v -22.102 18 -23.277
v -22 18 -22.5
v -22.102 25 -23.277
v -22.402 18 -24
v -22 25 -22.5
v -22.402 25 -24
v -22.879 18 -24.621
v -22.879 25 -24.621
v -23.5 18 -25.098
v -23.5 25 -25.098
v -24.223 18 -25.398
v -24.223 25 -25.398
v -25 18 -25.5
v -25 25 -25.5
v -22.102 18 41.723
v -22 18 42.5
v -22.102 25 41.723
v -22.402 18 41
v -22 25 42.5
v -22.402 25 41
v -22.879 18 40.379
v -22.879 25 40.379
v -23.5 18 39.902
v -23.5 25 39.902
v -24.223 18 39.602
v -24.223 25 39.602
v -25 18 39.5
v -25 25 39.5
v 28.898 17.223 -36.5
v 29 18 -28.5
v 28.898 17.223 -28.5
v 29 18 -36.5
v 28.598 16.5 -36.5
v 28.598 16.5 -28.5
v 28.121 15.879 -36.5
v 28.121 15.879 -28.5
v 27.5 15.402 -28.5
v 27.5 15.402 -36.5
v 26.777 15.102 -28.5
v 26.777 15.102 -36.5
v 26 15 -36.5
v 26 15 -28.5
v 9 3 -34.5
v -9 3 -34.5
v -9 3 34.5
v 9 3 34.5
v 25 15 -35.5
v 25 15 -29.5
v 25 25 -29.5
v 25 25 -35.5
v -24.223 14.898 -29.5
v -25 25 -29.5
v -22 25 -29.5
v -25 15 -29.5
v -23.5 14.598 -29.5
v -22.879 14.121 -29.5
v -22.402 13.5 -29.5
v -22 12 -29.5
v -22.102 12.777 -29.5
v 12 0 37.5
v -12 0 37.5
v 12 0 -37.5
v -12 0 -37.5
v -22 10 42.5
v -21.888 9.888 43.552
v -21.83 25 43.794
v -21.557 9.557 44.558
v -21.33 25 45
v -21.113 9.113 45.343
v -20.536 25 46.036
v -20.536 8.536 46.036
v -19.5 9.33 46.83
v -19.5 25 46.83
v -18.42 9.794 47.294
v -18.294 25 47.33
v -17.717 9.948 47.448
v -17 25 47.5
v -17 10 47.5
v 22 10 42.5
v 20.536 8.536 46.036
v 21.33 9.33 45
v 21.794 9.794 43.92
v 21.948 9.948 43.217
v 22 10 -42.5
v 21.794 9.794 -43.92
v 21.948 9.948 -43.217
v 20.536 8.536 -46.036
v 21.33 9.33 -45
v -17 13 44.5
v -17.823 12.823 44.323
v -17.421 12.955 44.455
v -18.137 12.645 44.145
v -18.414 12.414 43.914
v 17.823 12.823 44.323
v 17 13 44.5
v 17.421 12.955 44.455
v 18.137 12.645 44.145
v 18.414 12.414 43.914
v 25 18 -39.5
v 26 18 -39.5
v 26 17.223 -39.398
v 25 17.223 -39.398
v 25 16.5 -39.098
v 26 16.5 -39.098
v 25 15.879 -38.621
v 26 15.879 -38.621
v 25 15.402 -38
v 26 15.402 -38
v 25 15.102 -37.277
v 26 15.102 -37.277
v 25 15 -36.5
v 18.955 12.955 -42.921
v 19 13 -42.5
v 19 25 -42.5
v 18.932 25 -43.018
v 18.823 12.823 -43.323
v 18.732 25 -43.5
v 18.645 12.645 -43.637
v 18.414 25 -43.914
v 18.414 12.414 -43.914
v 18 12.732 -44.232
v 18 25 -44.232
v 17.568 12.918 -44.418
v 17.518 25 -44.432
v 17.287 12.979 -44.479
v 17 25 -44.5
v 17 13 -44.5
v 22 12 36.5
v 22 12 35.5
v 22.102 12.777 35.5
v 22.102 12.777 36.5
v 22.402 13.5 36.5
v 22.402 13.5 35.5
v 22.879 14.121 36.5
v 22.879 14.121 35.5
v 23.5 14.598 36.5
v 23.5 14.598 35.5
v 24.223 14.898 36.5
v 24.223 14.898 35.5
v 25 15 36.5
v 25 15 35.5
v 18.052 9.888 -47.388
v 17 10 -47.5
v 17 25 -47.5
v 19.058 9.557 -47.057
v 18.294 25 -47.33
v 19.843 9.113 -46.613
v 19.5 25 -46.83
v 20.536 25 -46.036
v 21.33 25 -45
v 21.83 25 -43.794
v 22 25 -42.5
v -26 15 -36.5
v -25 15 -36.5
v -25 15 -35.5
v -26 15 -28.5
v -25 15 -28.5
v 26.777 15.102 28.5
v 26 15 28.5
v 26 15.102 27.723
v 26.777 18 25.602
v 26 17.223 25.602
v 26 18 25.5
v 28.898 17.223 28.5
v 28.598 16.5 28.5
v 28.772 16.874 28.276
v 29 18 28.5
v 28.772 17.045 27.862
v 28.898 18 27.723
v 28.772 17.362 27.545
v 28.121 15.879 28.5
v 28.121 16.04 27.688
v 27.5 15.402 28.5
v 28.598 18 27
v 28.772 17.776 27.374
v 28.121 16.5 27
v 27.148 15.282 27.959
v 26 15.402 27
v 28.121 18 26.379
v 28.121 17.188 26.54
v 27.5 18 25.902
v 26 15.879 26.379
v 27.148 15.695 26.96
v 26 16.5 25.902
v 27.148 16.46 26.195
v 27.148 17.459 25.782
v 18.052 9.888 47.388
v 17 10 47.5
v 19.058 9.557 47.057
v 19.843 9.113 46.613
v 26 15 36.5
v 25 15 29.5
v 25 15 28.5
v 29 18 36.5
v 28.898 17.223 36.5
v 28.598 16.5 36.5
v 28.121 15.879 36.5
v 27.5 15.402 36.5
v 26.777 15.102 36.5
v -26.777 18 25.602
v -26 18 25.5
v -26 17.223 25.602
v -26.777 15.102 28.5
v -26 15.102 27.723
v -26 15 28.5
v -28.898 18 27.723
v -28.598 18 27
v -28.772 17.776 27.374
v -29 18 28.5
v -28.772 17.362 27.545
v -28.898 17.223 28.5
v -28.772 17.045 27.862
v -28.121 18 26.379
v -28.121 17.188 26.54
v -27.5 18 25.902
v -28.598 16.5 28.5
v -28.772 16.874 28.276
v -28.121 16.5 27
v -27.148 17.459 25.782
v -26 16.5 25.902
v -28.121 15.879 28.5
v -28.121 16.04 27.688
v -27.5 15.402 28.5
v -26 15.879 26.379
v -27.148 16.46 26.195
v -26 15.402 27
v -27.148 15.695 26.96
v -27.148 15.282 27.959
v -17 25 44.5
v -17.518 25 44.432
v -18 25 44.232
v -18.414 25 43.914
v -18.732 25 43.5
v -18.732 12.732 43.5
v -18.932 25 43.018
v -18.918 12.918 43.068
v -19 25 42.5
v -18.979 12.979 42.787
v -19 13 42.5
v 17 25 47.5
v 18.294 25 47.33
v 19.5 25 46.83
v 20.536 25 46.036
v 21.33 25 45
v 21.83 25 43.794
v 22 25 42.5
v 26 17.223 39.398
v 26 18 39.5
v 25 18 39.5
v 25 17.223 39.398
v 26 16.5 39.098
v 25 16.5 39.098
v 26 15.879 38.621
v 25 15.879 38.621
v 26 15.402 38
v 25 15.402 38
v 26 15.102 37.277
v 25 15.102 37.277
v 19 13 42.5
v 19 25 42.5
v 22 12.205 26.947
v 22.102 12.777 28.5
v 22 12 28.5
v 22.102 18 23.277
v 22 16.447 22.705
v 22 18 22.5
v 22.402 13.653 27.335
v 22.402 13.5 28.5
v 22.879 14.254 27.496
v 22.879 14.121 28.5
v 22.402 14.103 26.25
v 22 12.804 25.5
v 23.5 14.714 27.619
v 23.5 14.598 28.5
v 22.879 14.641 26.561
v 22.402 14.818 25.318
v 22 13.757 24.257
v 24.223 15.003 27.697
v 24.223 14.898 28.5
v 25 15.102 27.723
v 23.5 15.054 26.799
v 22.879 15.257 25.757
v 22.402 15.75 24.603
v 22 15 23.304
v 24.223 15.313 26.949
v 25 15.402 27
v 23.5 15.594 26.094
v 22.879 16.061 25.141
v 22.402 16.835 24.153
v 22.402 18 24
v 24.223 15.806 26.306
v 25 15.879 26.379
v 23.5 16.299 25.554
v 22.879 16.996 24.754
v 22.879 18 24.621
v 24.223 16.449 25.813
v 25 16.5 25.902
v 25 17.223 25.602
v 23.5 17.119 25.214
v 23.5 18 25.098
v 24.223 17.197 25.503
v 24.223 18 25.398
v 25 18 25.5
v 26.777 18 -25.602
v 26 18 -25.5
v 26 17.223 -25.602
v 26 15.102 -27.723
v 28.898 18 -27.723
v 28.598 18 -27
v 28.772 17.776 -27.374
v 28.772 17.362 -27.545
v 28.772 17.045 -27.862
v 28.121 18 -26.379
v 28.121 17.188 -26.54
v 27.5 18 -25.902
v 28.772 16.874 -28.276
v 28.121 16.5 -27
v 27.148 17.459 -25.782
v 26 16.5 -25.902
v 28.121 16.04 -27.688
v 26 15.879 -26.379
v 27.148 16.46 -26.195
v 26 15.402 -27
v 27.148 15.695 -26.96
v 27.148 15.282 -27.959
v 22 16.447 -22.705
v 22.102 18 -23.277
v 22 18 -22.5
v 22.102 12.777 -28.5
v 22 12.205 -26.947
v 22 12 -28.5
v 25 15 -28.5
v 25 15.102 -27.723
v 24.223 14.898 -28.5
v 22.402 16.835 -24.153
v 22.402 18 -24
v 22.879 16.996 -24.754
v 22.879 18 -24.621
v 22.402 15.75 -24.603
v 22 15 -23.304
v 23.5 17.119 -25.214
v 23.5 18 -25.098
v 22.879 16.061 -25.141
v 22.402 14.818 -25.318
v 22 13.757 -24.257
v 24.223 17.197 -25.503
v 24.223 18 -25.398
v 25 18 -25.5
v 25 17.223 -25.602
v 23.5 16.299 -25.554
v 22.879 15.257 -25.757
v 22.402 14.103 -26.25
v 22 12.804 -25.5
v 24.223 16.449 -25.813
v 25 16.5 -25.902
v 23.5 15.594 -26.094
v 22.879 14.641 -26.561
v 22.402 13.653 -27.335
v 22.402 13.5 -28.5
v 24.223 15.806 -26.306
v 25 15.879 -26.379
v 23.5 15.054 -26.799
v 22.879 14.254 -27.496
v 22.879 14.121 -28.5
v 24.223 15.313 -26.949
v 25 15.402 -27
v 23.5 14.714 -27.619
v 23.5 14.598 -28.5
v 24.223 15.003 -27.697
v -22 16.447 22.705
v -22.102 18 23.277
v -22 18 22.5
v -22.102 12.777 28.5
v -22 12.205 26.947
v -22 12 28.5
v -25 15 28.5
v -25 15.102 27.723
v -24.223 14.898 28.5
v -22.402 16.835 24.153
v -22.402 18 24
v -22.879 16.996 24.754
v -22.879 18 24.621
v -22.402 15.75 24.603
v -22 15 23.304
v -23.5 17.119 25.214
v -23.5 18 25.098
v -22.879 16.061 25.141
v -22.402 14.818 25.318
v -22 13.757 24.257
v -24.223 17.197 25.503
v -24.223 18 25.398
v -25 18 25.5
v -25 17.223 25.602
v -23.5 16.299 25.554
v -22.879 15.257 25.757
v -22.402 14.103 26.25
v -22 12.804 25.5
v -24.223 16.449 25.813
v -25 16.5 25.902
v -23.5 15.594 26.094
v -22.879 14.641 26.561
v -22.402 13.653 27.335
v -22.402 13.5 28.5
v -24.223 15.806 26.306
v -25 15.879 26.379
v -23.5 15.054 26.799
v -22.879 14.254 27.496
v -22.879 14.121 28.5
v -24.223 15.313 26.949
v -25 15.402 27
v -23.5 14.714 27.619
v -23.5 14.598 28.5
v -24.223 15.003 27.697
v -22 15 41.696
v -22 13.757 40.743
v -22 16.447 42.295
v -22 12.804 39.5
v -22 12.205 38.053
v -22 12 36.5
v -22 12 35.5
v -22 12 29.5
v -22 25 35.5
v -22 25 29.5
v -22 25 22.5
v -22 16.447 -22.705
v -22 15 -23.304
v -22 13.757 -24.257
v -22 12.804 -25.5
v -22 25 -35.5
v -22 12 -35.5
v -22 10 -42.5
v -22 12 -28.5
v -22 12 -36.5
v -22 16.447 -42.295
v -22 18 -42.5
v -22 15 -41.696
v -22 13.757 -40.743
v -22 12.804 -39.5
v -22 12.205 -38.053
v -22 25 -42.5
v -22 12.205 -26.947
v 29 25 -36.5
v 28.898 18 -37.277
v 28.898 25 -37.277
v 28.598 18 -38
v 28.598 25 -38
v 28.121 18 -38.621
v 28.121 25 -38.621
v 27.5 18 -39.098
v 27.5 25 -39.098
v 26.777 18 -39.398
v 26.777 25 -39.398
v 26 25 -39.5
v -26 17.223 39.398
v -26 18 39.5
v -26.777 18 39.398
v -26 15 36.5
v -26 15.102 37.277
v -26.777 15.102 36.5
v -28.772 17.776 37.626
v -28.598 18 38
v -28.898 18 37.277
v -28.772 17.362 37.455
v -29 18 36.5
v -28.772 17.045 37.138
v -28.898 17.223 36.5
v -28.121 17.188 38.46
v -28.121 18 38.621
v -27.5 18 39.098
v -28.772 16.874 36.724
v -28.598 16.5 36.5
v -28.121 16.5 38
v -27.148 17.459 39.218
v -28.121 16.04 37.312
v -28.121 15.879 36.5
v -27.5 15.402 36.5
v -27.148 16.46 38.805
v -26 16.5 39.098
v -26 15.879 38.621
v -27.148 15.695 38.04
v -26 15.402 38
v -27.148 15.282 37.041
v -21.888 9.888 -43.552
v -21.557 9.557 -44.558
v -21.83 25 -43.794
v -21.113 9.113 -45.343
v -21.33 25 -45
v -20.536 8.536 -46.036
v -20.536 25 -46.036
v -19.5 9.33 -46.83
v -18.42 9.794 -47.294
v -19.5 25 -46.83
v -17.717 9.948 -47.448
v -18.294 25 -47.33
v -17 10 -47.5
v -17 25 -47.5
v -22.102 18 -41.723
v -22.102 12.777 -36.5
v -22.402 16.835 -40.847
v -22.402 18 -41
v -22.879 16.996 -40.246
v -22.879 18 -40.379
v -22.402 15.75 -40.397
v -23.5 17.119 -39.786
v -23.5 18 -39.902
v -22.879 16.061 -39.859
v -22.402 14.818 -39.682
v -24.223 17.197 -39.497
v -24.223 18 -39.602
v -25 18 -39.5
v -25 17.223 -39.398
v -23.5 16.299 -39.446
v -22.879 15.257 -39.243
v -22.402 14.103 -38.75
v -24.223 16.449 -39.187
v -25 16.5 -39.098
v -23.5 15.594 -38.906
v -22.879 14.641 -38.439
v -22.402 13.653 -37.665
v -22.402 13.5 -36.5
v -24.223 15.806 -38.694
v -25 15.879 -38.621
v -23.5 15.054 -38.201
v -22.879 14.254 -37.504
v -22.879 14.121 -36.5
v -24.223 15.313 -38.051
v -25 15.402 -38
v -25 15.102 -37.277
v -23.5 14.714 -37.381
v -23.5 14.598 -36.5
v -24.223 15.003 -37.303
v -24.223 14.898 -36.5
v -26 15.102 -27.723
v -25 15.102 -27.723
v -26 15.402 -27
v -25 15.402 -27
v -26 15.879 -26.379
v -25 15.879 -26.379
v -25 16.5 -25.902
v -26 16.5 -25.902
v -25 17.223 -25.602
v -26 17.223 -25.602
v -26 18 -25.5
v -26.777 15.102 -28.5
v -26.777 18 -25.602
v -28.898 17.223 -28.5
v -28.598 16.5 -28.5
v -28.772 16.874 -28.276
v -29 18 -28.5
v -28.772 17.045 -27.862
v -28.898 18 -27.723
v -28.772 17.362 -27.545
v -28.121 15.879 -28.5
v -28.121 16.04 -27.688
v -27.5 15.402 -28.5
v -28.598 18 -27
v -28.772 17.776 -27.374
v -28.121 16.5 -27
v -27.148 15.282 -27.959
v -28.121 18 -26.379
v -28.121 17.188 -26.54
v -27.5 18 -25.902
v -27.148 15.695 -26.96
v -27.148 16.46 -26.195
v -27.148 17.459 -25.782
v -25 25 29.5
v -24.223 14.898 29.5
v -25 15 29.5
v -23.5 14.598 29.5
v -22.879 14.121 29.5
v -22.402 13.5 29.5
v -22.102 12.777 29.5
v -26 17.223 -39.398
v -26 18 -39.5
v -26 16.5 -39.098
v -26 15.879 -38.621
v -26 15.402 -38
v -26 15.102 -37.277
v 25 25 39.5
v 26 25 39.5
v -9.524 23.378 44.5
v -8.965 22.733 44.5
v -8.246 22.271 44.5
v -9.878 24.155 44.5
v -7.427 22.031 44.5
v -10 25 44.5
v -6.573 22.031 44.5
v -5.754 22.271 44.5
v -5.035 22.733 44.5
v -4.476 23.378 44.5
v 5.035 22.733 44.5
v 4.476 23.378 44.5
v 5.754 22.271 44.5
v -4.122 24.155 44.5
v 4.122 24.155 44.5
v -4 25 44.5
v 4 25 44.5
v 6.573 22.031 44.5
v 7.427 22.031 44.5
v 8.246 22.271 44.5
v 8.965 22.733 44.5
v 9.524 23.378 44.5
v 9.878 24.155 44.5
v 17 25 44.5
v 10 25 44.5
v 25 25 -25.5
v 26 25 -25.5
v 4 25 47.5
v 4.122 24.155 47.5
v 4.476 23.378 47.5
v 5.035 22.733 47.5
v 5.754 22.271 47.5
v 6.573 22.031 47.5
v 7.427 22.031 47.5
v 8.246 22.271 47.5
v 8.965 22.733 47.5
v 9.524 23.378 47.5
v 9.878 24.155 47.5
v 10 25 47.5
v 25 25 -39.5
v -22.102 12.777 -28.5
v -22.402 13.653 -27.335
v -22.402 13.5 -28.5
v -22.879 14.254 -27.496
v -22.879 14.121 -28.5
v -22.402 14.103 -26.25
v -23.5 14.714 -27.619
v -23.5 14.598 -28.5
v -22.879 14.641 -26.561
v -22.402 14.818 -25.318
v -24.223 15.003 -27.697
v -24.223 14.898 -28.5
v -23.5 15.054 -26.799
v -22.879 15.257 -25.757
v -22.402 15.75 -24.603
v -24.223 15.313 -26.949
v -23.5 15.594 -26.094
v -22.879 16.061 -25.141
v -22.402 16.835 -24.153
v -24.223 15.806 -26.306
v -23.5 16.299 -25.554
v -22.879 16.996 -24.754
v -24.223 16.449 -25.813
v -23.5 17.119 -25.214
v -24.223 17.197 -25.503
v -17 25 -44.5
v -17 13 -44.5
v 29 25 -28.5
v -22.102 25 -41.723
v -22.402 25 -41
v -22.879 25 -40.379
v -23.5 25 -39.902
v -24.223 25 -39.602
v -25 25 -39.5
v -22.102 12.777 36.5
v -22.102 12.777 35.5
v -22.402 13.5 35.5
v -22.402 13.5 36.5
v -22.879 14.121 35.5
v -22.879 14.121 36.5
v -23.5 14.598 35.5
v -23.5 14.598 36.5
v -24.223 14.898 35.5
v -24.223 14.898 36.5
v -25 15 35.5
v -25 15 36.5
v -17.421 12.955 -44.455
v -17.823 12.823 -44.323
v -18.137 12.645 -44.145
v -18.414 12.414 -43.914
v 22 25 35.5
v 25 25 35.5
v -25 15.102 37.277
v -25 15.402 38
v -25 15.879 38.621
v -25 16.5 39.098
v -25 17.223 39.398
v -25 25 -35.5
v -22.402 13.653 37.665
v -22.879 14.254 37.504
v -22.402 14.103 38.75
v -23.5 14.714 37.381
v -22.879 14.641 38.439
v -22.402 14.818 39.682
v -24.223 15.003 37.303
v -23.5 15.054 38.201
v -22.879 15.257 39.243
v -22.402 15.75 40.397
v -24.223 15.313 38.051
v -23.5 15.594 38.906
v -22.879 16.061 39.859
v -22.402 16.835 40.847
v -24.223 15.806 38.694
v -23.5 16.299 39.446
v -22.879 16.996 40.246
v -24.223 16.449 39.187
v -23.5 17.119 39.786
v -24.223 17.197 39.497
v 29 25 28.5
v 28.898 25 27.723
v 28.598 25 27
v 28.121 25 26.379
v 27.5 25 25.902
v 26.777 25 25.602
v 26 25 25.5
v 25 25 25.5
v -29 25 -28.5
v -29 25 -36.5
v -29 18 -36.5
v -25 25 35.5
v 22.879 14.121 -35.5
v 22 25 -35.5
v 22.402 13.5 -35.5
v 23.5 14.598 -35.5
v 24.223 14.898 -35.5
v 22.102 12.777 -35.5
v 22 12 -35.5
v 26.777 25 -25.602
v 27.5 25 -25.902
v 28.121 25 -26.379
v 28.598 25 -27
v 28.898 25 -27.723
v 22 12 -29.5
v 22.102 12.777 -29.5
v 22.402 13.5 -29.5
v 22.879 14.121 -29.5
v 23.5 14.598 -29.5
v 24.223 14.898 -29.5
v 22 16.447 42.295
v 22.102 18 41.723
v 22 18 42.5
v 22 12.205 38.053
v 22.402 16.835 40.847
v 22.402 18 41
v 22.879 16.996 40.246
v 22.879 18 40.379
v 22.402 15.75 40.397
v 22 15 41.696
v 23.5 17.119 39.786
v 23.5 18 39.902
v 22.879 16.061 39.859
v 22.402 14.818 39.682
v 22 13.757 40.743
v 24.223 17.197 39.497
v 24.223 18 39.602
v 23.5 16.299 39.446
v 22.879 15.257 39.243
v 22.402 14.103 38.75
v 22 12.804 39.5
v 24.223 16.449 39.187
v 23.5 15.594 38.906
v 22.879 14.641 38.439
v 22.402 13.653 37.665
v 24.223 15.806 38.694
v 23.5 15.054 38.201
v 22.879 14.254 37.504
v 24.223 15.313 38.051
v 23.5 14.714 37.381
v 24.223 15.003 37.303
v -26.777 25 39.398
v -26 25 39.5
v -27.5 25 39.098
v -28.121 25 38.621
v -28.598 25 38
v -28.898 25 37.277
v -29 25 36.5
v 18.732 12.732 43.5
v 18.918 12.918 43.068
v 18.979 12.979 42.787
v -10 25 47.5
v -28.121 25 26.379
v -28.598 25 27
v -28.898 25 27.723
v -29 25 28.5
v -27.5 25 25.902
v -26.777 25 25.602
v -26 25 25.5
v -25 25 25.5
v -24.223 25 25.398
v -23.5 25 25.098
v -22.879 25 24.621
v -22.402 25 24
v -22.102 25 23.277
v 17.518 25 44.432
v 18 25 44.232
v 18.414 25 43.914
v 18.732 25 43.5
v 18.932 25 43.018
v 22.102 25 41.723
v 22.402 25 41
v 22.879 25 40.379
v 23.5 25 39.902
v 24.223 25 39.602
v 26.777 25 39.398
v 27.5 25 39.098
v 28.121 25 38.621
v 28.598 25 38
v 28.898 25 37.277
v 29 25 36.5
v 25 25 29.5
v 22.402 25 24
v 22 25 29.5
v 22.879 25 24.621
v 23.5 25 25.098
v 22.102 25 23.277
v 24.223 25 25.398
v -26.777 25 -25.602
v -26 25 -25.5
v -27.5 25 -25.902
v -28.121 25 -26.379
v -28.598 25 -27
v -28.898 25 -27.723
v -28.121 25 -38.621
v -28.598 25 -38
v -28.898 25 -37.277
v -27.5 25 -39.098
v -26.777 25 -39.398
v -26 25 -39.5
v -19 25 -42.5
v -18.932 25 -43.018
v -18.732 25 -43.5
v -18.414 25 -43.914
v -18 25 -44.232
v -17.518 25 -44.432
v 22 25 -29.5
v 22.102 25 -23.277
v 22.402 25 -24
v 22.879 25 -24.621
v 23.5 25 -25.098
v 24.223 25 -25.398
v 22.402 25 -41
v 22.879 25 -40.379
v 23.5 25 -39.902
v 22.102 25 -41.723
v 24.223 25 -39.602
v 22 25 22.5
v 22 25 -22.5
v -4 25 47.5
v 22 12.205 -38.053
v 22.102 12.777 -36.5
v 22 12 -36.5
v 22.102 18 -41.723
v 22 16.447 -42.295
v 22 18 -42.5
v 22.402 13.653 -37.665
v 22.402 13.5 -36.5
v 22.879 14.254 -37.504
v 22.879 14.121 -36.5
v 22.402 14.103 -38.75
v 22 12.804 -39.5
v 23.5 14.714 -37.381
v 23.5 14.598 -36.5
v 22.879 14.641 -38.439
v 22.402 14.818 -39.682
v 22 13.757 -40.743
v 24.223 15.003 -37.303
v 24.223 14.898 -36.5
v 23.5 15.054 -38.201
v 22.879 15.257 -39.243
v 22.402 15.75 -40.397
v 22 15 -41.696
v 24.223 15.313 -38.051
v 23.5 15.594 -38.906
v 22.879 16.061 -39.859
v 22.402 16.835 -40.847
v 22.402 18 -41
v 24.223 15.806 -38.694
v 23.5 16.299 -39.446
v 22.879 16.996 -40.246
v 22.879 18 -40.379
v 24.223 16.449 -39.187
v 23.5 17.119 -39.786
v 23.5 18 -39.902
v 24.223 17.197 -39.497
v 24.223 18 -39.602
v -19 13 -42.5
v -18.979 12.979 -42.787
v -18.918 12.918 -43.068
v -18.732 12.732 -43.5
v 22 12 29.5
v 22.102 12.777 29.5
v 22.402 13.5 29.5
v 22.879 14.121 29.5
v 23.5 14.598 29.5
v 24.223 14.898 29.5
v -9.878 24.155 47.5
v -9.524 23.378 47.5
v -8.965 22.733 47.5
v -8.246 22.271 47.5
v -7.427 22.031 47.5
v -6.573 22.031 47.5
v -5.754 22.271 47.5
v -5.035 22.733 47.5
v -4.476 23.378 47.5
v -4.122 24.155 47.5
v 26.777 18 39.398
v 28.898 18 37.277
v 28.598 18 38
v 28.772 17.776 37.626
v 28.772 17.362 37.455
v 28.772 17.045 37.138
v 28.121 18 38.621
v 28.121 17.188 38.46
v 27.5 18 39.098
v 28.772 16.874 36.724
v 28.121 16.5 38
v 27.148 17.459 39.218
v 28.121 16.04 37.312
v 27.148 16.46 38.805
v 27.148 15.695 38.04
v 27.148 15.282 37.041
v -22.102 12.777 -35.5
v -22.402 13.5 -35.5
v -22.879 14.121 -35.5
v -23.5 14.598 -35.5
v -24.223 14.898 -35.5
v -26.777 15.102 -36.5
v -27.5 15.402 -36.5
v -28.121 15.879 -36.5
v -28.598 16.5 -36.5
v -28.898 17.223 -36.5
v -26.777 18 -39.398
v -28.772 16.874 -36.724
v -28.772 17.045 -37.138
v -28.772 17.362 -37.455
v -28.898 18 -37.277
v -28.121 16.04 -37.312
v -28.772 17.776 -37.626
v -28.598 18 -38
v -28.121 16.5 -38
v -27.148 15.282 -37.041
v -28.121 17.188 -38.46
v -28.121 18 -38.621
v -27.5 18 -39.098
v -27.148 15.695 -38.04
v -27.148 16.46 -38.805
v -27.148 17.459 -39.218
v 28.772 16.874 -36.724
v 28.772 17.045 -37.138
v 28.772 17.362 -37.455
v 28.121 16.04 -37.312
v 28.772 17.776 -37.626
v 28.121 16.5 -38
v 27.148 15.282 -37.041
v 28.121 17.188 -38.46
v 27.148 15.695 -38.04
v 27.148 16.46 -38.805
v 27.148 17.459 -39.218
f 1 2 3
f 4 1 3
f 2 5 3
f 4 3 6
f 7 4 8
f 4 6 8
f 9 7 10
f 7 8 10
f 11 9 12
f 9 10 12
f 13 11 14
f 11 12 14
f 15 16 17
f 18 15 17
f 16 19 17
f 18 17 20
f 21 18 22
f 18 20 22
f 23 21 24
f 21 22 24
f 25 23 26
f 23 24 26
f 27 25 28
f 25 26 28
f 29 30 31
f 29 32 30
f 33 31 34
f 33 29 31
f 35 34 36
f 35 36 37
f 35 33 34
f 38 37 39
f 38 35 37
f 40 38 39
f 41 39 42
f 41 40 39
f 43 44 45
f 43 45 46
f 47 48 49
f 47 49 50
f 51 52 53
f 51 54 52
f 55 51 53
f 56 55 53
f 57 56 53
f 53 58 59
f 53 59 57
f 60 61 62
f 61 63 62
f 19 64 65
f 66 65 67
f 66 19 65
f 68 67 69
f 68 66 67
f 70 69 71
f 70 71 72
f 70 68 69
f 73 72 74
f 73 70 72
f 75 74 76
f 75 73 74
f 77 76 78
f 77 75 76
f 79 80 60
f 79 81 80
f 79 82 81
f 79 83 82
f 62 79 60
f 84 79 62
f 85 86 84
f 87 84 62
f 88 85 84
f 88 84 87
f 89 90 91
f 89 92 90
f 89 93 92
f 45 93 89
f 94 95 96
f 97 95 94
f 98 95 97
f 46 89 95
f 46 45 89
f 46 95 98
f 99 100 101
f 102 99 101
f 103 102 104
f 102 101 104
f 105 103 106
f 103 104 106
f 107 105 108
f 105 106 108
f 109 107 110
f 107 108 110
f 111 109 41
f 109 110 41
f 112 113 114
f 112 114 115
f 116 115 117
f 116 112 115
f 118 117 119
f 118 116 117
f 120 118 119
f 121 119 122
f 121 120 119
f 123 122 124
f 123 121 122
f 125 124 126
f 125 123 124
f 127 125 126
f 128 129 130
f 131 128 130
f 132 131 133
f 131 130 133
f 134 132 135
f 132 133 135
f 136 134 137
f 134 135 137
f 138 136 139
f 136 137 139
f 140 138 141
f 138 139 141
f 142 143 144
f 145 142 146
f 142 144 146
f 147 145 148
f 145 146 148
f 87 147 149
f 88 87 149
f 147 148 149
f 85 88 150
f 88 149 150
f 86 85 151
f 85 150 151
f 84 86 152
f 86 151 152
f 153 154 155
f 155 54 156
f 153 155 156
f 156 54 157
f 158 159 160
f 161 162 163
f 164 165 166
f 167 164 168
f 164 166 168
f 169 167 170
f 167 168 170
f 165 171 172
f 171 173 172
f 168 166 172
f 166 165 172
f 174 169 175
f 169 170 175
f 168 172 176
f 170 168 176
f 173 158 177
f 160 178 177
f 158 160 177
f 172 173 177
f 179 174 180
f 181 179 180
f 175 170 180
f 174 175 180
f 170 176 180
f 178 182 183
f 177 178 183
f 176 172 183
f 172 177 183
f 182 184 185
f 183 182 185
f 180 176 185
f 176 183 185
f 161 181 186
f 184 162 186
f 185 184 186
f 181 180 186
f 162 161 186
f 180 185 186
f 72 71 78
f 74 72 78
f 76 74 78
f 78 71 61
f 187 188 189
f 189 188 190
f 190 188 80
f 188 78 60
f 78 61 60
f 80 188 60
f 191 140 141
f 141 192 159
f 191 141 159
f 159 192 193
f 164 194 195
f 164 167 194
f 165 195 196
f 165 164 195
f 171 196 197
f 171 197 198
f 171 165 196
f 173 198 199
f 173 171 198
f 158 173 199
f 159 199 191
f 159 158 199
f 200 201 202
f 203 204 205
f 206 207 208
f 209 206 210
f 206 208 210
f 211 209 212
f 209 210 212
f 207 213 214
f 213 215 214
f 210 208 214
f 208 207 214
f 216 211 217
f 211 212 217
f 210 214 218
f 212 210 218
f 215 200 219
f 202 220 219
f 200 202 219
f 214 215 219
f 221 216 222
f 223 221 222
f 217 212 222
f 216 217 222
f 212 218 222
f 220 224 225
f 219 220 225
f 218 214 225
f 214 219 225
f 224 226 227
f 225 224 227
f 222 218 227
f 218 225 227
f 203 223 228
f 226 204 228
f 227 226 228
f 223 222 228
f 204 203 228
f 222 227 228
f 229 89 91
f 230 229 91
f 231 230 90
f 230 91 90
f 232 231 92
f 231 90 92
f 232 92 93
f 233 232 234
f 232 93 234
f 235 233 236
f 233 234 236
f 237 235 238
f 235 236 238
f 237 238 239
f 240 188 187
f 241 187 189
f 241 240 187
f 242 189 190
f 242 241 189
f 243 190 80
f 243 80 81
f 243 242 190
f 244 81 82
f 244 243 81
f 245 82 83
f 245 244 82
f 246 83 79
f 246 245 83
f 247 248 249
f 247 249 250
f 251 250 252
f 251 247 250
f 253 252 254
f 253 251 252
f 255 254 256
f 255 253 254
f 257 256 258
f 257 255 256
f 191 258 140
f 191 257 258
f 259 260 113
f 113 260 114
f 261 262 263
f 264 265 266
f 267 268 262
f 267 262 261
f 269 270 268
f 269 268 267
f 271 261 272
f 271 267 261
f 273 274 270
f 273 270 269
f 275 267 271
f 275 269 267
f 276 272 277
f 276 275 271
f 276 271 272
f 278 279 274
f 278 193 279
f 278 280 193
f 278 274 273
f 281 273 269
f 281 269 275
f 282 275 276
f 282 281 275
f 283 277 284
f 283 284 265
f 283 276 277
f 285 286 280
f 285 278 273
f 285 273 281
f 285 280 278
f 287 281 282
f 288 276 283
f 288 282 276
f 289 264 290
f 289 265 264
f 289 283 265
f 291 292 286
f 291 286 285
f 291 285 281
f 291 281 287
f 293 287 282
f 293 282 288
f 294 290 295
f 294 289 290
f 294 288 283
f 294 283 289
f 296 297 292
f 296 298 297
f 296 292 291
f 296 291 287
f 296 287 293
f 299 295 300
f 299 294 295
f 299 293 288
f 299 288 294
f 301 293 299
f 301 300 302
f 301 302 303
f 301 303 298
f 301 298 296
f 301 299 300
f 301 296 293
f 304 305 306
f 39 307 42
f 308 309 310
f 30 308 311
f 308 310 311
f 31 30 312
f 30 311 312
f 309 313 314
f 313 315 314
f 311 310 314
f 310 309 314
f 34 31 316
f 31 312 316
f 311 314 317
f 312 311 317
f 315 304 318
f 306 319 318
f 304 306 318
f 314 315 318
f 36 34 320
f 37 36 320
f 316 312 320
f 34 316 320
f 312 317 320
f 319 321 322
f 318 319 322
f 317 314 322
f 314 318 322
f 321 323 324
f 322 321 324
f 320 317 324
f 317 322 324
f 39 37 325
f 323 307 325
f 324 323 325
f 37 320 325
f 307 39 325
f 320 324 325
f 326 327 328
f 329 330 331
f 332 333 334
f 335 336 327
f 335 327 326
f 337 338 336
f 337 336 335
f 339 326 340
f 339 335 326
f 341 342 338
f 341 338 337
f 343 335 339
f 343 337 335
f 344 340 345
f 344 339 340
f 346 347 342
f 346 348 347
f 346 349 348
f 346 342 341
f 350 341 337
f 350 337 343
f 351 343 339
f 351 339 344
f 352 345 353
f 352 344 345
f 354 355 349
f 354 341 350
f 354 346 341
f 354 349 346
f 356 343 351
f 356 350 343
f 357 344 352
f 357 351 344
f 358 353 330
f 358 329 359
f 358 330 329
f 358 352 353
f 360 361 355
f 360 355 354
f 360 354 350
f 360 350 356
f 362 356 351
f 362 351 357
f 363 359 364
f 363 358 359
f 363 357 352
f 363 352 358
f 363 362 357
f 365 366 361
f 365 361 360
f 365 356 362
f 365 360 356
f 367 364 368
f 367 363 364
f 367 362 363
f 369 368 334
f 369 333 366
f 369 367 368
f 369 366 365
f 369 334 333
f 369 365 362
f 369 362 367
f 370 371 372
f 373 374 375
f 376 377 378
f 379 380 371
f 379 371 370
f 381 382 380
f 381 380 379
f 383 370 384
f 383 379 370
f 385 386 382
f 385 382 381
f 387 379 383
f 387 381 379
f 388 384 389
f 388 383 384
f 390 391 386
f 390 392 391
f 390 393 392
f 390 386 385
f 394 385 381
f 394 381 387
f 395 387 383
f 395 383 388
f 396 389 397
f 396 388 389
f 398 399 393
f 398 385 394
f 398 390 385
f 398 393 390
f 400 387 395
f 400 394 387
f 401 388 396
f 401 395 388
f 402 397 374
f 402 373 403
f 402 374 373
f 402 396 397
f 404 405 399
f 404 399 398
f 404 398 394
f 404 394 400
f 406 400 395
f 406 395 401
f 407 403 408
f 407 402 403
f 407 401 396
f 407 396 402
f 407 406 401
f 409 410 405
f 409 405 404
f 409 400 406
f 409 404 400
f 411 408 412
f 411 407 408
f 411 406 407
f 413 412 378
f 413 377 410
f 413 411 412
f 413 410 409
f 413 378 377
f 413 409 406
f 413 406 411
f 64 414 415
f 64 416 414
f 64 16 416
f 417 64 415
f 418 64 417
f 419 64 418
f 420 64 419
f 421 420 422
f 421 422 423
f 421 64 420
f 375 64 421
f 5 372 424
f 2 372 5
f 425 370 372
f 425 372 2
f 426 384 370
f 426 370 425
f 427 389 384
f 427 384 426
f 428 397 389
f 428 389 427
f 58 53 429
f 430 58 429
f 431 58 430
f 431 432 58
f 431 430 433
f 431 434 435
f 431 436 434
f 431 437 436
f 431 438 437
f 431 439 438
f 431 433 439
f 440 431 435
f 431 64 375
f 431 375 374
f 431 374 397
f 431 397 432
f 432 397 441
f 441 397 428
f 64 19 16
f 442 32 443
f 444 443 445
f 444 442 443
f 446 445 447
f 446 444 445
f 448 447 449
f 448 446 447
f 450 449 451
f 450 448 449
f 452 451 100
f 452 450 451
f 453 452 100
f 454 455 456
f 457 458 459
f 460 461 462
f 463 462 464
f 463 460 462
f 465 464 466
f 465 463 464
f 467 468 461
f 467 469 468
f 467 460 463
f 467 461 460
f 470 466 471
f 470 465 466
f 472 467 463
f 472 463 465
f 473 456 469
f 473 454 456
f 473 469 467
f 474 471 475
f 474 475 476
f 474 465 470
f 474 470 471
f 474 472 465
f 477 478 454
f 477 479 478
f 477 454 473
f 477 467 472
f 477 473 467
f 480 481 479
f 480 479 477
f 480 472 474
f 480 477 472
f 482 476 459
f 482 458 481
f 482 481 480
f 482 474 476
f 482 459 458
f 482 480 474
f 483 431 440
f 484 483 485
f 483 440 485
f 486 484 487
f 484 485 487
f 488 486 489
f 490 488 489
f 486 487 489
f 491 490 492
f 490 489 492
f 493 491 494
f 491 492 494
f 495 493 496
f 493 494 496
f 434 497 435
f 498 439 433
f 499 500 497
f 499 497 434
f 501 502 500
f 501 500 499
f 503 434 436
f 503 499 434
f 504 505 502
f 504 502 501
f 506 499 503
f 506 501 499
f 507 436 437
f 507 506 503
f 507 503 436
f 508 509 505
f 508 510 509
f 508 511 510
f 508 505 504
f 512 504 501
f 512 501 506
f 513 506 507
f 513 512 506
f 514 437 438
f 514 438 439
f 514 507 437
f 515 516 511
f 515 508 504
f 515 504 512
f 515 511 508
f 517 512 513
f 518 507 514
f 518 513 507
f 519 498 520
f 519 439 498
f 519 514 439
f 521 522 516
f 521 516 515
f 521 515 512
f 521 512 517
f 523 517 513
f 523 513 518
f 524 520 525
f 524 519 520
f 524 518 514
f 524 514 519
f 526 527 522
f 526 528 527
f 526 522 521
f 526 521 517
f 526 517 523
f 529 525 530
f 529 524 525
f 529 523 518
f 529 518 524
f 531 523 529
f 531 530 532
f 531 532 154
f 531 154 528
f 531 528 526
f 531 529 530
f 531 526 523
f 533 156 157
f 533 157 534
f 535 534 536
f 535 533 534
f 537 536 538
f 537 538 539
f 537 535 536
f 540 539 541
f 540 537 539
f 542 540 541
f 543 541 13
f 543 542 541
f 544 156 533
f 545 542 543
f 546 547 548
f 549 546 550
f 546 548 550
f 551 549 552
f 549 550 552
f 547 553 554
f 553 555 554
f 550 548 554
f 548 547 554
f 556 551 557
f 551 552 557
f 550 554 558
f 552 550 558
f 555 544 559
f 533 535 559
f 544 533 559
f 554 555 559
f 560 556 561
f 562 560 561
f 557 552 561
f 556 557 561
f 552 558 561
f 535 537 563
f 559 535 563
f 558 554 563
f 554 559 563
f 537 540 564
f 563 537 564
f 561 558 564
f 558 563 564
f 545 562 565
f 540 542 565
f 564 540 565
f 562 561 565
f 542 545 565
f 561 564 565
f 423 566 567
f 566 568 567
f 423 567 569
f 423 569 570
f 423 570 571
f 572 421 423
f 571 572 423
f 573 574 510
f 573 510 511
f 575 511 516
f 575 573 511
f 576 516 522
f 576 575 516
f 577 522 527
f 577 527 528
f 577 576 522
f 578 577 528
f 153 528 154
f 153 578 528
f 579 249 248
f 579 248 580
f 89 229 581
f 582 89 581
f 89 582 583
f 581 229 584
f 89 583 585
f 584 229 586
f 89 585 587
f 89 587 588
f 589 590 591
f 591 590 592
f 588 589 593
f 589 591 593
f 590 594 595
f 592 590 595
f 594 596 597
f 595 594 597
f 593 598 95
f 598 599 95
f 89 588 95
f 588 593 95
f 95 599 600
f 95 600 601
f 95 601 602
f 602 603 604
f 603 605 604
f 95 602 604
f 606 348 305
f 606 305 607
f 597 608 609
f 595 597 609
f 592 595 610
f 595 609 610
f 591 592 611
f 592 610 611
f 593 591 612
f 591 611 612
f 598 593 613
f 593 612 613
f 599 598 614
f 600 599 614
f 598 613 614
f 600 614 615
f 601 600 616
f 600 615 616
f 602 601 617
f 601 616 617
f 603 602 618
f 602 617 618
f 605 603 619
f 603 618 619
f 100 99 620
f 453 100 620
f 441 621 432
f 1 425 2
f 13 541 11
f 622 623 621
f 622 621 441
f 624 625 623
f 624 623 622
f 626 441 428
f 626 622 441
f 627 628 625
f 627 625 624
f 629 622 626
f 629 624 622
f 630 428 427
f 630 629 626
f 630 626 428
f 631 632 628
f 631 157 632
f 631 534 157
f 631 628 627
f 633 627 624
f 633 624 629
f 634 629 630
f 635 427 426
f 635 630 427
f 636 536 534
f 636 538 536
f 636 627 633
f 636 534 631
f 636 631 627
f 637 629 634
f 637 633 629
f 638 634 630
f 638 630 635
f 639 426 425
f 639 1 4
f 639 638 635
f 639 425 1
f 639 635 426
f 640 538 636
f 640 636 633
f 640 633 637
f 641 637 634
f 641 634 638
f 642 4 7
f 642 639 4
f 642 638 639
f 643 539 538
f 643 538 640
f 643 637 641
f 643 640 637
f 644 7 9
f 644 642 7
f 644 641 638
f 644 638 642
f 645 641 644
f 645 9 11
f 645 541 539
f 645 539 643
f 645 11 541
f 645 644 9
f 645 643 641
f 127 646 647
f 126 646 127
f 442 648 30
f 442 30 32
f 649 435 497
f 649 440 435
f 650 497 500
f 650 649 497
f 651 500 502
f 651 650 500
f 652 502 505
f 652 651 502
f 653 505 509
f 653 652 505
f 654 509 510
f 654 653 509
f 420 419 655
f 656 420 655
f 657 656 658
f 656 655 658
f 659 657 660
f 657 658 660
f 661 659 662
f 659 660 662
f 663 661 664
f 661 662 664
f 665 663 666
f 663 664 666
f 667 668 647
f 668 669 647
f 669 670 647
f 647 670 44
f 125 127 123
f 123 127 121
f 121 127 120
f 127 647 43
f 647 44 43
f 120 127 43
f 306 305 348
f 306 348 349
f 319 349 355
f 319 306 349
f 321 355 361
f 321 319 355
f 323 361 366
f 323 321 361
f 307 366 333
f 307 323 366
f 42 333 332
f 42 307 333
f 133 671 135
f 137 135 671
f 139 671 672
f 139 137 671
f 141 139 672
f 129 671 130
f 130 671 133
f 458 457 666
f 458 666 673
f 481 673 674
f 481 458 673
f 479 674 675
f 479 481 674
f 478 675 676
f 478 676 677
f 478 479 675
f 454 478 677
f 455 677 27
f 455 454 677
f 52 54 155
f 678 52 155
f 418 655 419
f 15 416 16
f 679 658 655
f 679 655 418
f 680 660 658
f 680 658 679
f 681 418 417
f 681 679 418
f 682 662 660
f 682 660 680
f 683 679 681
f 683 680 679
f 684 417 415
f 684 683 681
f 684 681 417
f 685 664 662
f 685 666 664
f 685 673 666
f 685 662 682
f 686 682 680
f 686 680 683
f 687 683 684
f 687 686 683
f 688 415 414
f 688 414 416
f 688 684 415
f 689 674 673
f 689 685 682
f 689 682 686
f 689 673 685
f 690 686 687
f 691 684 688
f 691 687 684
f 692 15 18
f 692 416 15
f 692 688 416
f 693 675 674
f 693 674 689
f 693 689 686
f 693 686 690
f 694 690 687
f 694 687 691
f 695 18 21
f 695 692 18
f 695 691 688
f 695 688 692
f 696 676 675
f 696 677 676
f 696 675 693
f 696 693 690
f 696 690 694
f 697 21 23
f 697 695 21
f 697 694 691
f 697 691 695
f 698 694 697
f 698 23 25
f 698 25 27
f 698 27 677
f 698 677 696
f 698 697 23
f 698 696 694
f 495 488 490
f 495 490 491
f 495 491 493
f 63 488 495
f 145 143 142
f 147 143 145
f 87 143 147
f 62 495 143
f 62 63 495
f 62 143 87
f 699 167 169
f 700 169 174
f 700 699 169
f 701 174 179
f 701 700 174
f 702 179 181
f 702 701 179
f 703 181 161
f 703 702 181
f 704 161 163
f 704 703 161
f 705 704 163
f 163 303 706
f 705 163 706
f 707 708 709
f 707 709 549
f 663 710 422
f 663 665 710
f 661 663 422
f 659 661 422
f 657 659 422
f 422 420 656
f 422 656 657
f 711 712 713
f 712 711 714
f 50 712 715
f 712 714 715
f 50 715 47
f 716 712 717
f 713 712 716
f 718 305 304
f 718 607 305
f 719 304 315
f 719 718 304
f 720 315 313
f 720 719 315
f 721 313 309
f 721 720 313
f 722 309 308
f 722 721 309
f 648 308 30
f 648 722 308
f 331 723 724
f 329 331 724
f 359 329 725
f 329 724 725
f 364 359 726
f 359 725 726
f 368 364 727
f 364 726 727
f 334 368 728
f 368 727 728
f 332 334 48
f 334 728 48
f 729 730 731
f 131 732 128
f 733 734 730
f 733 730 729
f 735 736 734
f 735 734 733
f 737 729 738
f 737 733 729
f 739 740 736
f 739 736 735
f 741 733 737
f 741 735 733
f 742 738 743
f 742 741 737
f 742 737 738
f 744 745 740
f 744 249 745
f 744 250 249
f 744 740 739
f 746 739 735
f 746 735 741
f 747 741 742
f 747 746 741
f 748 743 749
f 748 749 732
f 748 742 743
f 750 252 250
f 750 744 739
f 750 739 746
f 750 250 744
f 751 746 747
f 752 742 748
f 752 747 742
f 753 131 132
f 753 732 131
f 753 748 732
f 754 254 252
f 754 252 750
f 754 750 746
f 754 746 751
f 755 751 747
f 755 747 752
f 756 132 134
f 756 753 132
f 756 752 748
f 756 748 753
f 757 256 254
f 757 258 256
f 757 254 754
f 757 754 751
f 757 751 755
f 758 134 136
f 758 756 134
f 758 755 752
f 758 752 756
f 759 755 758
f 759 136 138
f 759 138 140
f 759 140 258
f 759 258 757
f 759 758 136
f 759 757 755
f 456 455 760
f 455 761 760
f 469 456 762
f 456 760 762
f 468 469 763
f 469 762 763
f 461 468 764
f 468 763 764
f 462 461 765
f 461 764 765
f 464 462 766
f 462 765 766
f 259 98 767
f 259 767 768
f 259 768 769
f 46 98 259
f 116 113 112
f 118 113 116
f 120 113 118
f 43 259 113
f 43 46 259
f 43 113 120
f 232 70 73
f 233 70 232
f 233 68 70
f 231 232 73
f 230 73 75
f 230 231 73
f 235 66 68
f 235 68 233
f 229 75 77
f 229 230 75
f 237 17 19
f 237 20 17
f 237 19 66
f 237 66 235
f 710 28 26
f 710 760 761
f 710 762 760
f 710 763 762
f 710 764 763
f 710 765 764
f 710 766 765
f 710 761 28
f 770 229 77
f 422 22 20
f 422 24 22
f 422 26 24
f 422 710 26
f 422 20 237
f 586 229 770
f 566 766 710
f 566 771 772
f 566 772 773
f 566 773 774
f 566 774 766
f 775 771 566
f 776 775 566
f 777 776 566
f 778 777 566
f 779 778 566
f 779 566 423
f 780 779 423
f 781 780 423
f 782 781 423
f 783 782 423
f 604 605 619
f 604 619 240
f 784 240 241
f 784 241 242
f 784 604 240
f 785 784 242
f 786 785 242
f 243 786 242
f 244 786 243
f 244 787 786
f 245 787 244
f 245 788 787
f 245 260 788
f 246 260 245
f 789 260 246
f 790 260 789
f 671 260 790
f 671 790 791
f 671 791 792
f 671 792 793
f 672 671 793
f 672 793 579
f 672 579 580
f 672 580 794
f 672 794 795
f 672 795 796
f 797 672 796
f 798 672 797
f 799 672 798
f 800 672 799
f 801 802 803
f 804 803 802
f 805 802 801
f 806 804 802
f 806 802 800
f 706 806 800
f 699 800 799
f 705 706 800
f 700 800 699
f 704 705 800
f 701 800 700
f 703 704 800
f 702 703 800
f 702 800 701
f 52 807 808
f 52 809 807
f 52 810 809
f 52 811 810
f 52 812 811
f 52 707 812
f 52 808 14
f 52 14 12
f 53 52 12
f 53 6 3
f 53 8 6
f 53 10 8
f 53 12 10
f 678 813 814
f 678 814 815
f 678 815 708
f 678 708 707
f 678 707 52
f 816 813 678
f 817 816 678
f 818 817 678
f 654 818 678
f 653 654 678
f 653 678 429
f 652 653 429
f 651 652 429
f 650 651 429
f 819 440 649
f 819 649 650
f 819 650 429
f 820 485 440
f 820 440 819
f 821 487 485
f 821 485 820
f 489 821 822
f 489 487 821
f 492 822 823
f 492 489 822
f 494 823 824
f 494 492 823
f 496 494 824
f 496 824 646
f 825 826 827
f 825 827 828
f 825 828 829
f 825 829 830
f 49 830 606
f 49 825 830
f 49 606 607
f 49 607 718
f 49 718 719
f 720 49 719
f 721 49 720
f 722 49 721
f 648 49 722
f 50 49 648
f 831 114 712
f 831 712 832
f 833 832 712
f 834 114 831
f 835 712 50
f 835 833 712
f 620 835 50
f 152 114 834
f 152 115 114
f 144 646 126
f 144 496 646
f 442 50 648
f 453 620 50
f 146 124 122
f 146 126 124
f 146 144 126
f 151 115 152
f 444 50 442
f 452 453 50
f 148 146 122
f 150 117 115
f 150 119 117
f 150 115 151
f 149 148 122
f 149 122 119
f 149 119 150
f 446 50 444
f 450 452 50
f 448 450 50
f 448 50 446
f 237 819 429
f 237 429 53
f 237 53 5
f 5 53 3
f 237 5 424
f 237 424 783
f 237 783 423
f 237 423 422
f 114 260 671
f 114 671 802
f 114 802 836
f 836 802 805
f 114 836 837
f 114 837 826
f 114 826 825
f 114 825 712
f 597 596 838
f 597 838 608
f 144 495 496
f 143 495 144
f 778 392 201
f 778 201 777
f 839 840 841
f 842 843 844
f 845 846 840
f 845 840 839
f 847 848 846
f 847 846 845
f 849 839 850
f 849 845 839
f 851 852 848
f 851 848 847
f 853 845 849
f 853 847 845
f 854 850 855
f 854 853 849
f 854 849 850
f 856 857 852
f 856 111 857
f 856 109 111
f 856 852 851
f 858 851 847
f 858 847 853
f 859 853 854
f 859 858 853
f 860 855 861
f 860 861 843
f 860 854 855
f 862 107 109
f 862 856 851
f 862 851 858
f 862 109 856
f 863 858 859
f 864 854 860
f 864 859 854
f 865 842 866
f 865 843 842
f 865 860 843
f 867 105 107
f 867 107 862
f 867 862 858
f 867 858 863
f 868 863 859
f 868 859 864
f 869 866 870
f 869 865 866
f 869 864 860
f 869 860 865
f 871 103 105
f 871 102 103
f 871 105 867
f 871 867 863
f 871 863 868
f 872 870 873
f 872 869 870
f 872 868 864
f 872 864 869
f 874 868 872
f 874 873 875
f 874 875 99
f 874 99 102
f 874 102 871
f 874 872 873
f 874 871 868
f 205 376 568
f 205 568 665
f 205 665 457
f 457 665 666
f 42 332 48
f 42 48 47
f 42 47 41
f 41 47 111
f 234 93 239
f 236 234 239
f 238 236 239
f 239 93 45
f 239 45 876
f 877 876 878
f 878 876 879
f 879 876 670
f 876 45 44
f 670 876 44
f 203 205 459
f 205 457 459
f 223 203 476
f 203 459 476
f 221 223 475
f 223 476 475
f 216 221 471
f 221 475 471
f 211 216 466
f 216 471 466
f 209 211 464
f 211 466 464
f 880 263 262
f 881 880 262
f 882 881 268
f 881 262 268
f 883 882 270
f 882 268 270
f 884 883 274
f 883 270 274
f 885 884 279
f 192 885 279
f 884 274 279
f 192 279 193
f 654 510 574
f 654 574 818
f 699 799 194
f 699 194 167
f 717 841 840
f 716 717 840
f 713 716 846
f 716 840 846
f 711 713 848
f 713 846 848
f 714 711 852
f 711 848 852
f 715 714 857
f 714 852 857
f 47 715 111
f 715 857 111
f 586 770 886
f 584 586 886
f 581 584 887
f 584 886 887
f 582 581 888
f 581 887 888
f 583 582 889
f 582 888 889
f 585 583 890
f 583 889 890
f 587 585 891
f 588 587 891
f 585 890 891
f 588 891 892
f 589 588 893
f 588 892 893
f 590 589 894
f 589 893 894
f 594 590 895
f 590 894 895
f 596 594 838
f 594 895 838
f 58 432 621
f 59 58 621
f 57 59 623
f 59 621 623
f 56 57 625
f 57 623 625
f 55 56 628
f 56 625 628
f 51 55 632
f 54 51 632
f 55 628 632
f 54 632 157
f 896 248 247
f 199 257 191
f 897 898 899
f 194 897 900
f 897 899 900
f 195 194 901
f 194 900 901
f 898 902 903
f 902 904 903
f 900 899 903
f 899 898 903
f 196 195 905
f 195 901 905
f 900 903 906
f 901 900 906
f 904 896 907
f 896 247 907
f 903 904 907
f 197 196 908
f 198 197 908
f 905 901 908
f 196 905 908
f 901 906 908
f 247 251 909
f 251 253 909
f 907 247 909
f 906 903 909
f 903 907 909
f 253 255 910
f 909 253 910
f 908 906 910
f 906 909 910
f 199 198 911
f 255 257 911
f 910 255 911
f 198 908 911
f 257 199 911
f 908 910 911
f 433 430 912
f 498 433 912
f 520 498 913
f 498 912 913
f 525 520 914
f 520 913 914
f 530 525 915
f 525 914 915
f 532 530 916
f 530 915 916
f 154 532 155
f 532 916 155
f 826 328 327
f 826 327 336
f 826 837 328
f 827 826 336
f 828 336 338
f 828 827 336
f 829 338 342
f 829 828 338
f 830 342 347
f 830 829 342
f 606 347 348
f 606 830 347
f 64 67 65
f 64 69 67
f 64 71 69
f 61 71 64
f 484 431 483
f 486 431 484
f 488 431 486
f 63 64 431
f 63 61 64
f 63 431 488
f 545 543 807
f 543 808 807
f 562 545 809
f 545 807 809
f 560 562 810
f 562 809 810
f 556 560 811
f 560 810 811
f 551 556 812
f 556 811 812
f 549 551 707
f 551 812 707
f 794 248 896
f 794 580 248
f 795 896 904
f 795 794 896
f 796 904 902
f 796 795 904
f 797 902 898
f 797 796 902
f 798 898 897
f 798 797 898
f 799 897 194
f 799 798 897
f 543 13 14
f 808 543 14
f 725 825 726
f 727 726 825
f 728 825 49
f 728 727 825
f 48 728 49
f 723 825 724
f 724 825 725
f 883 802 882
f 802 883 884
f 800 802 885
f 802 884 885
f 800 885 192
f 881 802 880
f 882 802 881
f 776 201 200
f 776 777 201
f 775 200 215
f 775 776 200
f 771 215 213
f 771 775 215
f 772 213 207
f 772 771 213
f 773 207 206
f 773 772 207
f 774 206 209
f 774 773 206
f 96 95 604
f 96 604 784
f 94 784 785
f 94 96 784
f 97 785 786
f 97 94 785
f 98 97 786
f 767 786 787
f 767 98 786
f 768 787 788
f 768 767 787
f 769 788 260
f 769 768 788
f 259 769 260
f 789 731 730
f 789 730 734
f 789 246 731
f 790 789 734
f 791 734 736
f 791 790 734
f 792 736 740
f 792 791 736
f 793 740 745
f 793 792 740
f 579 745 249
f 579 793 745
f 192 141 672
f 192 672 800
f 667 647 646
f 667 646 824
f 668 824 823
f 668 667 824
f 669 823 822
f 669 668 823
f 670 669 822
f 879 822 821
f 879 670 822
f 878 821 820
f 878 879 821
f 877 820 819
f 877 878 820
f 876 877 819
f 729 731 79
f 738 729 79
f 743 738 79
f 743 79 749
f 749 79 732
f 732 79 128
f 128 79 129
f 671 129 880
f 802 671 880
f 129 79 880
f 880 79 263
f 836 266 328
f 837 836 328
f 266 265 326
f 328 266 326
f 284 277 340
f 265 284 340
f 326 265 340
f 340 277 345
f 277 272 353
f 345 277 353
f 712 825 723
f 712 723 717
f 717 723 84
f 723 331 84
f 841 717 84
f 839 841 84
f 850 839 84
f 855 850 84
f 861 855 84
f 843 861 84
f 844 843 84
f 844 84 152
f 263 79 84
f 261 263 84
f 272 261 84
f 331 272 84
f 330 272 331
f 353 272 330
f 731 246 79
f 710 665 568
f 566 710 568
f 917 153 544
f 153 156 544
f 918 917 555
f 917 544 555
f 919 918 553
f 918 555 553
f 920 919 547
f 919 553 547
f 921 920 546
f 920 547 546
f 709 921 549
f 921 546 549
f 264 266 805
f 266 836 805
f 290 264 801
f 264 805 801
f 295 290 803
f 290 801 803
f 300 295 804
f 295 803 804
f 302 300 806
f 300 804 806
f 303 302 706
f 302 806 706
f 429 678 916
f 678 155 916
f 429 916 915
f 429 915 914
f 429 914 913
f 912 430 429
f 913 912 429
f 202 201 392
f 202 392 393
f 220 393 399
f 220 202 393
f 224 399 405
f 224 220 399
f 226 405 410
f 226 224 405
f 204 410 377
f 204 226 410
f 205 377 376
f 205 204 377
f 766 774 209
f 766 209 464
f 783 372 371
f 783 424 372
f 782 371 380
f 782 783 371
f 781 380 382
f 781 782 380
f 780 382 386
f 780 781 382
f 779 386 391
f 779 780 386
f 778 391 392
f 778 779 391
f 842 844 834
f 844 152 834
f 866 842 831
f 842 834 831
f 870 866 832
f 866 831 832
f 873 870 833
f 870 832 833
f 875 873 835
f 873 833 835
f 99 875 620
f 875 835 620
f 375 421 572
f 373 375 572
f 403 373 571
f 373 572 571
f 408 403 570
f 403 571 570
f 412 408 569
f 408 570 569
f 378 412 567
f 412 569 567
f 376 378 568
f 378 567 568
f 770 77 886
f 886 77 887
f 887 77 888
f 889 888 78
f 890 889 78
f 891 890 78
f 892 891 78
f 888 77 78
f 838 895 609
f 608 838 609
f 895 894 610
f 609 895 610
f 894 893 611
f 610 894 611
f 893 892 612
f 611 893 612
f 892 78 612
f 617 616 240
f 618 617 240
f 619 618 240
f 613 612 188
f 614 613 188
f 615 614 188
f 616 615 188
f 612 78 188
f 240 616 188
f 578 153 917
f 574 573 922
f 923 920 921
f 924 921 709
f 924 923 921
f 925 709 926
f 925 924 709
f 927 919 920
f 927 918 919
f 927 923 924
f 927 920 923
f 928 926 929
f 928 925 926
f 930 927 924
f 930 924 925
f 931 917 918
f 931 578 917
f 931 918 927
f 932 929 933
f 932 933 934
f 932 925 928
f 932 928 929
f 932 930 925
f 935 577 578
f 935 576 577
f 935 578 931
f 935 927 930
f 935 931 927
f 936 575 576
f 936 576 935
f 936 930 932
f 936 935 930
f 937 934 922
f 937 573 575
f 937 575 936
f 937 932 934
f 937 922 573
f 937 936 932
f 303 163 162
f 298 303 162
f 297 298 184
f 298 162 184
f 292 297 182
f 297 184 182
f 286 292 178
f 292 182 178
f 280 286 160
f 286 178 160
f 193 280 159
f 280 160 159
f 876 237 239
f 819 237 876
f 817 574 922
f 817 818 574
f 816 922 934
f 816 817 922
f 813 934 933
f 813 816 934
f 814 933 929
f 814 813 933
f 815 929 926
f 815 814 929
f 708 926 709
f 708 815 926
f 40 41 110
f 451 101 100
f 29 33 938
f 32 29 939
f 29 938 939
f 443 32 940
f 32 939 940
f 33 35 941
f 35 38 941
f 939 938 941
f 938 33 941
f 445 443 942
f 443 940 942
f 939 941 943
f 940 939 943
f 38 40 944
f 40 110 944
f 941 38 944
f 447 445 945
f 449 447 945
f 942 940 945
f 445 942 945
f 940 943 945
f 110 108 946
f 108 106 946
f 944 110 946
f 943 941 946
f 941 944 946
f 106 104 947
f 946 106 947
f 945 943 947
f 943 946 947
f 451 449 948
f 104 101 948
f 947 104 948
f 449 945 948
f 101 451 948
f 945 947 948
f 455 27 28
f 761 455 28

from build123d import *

# Parameters (mm, degrees)
SKETCH1_W               = 44
SKETCH1_H               = 95
BOSS_EXTRUDE1_DEPTH     = 25
SKETCH2_W               = 38
SKETCH2_H               = 89
CUT_EXTRUDE1_DEPTH      = 22
CHAMFER1_SIZE           = 10
FILLET1_R               = 2
FILLET2_R               = 5
SKETCH3_W               = 14
SKETCH3_H               = 10
BOSS_EXTRUDE2_DEPTH     = 7
SKETCH5_W               = 14
SKETCH5_H               = 10
BOSS_EXTRUDE3_DEPTH     = 7
FILLET3_R               = 3
CUT_EXTRUDE2_DEPTH      = 62.010245041
CUT_EXTRUDE2_DEPTH_BACK = 62.010245041
SKETCH7_W               = 3
SKETCH7_H               = 6
SKETCH8_R               = 3
CUT_EXTRUDE3_DEPTH      = 10


with BuildPart() as part:
    # Sketch1 → Boss-Extrude1 (new body)
    with BuildSketch(Plane(origin=(0, 0, 0), x_dir=(1, 0, 0), z_dir=(0, 1, 0))):
        Rectangle(SKETCH1_W, SKETCH1_H)
    extrude(amount=BOSS_EXTRUDE1_DEPTH)

    # Sketch2 → Cut-Extrude1 (cut)
    with BuildSketch(Plane(origin=(0, 25, 0), x_dir=(1, 0, 0), z_dir=(0, 1, 0))):
        Rectangle(SKETCH2_W, SKETCH2_H)
    extrude(amount=-CUT_EXTRUDE1_DEPTH, mode=Mode.SUBTRACT)

    # Chamfer1
    chamfer1_edges = [part.edges().sort_by_distance(p)[0] for p in [
        (-19, 3, 0),
        (0, 3, -44.5),
        (19, 3, 0),
        (0, 3, 44.5),
        (0, 0, 47.5),
        (-22, 0, 0),
        (0, 0, -47.5),
        (22, 0, 0),
    ]]
    chamfer(chamfer1_edges, length=CHAMFER1_SIZE)

    # Fillet1
    fillet1_edges = [part.edges().sort_by_distance(p)[0] for p in [
        (-19, 19, -44.5),
        (19, 19, -44.5),
        (19, 19, 44.5),
        (-19, 19, 44.5),
    ]]
    fillet(fillet1_edges, radius=FILLET1_R)

    # Fillet2
    fillet2_edges = [part.edges().sort_by_distance(p)[0] for p in [
        (22, 17.5, 47.5),
        (-22, 17.5, 47.5),
        (-22, 17.5, -47.5),
        (22, 17.5, -47.5),
    ]]
    fillet(fillet2_edges, radius=FILLET2_R)

    # Sketch3 → Boss-Extrude2 (add)
    with BuildSketch(Plane(origin=(22, 0, 0), x_dir=(0, 0, -1), z_dir=(1, 0, 0))):
        with Locations((-32.5, 20)):
            Rectangle(SKETCH3_W, SKETCH3_H)
        with Locations((32.5, 20)):
            Rectangle(SKETCH3_W, SKETCH3_H)
    extrude(amount=BOSS_EXTRUDE2_DEPTH)

    # Sketch5 → Boss-Extrude3 (add)
    with BuildSketch(Plane.ZY.offset(22)):
        with Locations((32.5, 20)):
            Rectangle(SKETCH5_W, SKETCH5_H)
        with Locations((-32.5, 20)):
            Rectangle(SKETCH5_W, SKETCH5_H)
    extrude(amount=BOSS_EXTRUDE3_DEPTH)

    # Fillet3
    fillet3_edges = [part.edges().sort_by_distance(p)[0] for p in [
        (22, 20, 39.5),
        (22, 15, 32.5),
        (25.5, 15, 39.5),
        (22, 20, 25.5),
        (25.5, 15, 25.5),
        (29, 20, 39.5),
        (29, 15, 32.5),
        (29, 20, 25.5),
        (22, 20, -25.5),
        (22, 15, -32.5),
        (25.5, 15, -25.5),
        (22, 20, -39.5),
        (25.5, 15, -39.5),
        (29, 20, -25.5),
        (29, 15, -32.5),
        (29, 20, -39.5),
        (-22, 20, 39.5),
        (-25.5, 15, 39.5),
        (-22, 20, 25.5),
        (-22, 15, 32.5),
        (-25.5, 15, 25.5),
        (-29, 20, 39.5),
        (-29, 20, 25.5),
        (-29, 15, 32.5),
        (-22, 15, -32.5),
        (-25.5, 15, -39.5),
        (-22, 20, -25.5),
        (-25.5, 15, -25.5),
        (-22, 20, -39.5),
        (-29, 15, -32.5),
        (-29, 20, -25.5),
        (-29, 20, -39.5),
    ]]
    fillet(fillet3_edges, radius=FILLET3_R - 0.0001)  # a hair under: the kernel refuses the full size

    # Sketch7 → Cut-Extrude2 (cut, two sides: drawn at the far end of the back side and taken through both)
    with BuildSketch(Plane(origin=(0, 25, 0), x_dir=(1, 0, 0), z_dir=(0, 1, 0)).offset(-CUT_EXTRUDE2_DEPTH_BACK)):
        with Locations((-23.5, 32.5)):
            Rectangle(SKETCH7_W, SKETCH7_H)
        with Locations((23.5, 32.5)):
            Rectangle(SKETCH7_W, SKETCH7_H)
        with Locations((23.5, -32.5)):
            Rectangle(SKETCH7_W, SKETCH7_H)
        with Locations((-23.5, -32.5)):
            Rectangle(SKETCH7_W, SKETCH7_H)
    extrude(amount=CUT_EXTRUDE2_DEPTH + CUT_EXTRUDE2_DEPTH_BACK, mode=Mode.SUBTRACT)

    # Sketch8 → Cut-Extrude3 (cut)
    with BuildSketch(Plane.XY.offset(47.5)):
        with Locations((7, 25)):
            Circle(SKETCH8_R)
        with Locations((-7, 25)):
            Circle(SKETCH8_R)
    extrude(amount=-CUT_EXTRUDE3_DEPTH, mode=Mode.SUBTRACT)


solid = part.part
